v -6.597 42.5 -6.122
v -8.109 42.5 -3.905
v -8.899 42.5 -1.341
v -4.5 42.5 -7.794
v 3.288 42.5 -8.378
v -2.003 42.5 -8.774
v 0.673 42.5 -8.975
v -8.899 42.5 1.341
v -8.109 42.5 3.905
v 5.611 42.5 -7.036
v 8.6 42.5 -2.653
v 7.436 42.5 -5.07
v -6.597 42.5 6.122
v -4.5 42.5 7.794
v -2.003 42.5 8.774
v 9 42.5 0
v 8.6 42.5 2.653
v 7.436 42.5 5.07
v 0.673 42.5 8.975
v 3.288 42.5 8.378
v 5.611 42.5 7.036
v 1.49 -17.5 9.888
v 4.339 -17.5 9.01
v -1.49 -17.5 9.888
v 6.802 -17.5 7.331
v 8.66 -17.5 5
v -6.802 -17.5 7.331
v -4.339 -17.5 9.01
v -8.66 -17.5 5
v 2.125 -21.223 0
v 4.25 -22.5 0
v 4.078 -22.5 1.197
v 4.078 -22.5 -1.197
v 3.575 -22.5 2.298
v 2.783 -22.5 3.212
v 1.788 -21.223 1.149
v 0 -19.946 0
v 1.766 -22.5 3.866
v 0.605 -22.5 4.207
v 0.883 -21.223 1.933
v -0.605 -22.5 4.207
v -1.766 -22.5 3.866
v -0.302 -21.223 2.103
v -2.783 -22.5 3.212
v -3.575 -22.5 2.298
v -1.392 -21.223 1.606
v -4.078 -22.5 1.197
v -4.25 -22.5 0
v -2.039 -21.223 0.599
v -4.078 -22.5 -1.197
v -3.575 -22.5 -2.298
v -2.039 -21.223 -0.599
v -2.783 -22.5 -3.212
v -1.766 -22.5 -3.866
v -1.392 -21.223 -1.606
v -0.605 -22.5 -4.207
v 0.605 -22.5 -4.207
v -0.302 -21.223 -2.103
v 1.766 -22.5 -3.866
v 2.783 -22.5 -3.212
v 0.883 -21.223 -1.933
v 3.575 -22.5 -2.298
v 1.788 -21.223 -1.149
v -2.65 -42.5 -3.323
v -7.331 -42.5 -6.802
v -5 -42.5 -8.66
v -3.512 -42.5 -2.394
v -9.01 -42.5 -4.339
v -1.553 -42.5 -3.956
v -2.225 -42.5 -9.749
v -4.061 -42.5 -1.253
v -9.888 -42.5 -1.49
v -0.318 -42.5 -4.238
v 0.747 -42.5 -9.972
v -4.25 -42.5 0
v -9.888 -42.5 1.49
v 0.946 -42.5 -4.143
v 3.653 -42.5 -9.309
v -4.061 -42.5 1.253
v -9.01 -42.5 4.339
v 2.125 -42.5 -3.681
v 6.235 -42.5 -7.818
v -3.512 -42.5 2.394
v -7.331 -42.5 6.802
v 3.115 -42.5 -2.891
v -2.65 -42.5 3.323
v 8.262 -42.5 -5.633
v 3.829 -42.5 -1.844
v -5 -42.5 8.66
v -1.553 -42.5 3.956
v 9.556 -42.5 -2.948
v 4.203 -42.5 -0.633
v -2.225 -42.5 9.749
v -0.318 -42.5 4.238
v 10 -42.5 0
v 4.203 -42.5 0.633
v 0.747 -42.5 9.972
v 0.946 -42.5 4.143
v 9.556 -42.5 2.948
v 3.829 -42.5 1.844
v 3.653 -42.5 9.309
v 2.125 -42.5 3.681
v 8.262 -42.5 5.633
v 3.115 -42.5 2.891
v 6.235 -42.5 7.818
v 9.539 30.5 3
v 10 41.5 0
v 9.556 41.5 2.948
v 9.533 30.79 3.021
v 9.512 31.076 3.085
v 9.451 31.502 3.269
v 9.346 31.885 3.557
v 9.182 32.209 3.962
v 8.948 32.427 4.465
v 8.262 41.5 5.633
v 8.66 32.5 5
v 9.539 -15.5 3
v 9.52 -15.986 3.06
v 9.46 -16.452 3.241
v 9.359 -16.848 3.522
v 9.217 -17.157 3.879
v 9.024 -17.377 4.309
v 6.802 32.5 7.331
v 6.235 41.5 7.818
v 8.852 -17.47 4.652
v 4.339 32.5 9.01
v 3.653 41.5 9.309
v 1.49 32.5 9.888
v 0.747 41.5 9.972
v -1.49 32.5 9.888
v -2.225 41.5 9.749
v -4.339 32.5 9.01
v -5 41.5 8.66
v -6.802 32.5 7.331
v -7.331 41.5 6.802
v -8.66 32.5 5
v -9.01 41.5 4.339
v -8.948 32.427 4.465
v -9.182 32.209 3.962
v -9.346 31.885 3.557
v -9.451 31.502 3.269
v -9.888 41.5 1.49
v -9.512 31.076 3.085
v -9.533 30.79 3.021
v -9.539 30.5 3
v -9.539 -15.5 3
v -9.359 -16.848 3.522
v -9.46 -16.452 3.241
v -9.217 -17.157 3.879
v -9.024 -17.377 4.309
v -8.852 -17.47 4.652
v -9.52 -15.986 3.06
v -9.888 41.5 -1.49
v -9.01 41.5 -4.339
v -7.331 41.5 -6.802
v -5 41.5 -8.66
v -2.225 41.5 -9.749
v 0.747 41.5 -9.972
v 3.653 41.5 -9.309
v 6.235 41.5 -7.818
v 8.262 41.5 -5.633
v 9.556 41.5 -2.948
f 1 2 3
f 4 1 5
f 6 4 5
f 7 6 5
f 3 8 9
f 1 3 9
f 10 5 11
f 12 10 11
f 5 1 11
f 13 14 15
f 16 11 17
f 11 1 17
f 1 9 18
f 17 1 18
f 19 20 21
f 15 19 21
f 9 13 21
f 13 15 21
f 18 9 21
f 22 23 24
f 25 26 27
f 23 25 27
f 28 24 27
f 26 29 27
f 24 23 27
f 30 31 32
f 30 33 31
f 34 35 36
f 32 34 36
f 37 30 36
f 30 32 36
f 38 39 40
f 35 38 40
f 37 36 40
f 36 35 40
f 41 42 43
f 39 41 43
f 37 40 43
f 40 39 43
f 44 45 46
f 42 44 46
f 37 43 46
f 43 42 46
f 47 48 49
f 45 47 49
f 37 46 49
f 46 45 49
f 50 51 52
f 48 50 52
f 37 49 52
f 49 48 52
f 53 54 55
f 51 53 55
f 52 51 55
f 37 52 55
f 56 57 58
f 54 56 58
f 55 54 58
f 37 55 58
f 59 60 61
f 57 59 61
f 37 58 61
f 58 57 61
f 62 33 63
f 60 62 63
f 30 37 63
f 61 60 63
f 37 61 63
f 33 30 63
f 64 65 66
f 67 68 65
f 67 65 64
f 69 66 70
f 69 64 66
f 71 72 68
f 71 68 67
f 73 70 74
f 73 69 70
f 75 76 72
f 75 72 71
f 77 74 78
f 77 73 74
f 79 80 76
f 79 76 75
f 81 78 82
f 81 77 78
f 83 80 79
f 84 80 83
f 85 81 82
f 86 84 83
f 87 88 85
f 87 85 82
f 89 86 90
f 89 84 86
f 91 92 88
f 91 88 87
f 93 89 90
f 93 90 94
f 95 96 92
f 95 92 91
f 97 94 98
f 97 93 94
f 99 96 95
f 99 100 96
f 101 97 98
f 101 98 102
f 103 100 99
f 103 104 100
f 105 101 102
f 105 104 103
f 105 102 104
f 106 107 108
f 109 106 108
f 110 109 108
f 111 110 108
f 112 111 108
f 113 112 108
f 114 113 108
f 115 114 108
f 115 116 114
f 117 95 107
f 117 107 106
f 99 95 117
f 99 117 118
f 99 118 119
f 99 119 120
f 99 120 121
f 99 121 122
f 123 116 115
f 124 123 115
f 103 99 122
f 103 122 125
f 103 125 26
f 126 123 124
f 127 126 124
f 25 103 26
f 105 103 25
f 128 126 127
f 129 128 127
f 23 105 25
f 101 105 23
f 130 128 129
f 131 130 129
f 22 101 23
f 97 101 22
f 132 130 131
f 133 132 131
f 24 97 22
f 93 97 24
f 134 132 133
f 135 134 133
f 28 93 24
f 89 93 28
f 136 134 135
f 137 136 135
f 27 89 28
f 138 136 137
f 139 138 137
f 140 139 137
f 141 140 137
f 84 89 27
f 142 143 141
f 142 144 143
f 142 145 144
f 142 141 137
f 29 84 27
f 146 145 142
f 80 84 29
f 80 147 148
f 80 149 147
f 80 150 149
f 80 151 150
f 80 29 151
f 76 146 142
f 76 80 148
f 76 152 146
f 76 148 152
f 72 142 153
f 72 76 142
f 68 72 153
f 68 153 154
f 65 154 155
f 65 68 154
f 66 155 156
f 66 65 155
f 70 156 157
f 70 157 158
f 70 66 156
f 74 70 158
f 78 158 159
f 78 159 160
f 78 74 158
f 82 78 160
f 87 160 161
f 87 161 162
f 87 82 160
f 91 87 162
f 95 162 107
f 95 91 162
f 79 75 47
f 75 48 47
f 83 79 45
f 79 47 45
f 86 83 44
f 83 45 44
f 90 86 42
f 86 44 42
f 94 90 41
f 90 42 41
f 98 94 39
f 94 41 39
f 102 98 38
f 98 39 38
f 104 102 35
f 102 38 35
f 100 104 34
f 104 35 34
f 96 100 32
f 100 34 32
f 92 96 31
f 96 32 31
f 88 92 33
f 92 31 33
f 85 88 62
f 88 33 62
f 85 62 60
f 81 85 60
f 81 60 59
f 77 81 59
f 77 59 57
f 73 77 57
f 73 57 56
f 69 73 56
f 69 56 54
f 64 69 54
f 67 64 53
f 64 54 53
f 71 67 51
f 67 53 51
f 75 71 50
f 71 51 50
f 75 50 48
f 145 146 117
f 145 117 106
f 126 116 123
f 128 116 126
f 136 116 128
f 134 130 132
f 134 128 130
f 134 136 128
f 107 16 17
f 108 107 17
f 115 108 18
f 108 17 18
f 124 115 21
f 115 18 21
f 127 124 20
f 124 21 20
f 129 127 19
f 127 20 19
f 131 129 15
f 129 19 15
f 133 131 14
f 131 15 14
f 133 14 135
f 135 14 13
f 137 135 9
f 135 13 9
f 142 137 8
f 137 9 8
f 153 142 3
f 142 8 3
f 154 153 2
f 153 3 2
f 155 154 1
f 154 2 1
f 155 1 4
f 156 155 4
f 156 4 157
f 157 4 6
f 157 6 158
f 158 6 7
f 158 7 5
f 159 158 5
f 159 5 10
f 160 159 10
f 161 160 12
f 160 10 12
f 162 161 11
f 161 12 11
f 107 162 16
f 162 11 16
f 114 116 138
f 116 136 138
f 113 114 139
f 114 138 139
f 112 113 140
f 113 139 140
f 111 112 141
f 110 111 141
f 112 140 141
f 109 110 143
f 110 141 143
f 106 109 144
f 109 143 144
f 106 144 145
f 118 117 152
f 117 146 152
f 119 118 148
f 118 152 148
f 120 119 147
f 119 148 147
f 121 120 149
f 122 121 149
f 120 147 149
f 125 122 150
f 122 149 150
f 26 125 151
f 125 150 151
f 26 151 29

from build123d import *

# Parameters (mm, degrees)
F0_R          = 10
F1_DEPTH      = 42.5
F3_D          = 8.5
F3_DEPTH      = 20
F3_TIP        = 2.5536576309
F4_SIZE       = 1
F5_W          = 50
F5_H          = 7
F6_DEPTH      = 10.001
F6_DEPTH_BACK = 10.001
F7_R          = 2


with BuildPart() as f1:
    # F0 (on Front) → F1 (new body, symmetric)
    with BuildSketch(Plane.XZ):
        Circle(F0_R)
    extrude(amount=F1_DEPTH, both=True)

    # F3
    with Locations(Plane.XZ.offset(42.5)):
        with Locations((0, 0)):
            Hole(F3_D / 2, depth=F3_DEPTH)
            with Locations((0, 0, -(F3_DEPTH + F3_TIP / 2))):  # 118° drill point
                Cone(0, F3_D / 2, F3_TIP, mode=Mode.SUBTRACT)

    # F4
    f4_edges = [f1.edges().sort_by_distance(p)[0] for p in [
        (-10, 42.5, 0),
    ]]
    chamfer(f4_edges, length=F4_SIZE)

    # F5 (on Right) → F6 (cut, two sides)
    with BuildSketch(Plane.YZ) as f6_sk:
        with Locations((7.5, 6.5)):
            Rectangle(F5_W, F5_H)
    extrude(amount=-F6_DEPTH, mode=Mode.SUBTRACT)
    extrude(f6_sk.sketch, amount=F6_DEPTH_BACK, mode=Mode.SUBTRACT)

    # F7
    f7_edges = [f1.edges().sort_by_distance(p)[0] for p in [
        (0, -17.5, 3),
        (0, 32.5, 3),
    ]]
    fillet(f7_edges, radius=F7_R)


solid = f1.part
